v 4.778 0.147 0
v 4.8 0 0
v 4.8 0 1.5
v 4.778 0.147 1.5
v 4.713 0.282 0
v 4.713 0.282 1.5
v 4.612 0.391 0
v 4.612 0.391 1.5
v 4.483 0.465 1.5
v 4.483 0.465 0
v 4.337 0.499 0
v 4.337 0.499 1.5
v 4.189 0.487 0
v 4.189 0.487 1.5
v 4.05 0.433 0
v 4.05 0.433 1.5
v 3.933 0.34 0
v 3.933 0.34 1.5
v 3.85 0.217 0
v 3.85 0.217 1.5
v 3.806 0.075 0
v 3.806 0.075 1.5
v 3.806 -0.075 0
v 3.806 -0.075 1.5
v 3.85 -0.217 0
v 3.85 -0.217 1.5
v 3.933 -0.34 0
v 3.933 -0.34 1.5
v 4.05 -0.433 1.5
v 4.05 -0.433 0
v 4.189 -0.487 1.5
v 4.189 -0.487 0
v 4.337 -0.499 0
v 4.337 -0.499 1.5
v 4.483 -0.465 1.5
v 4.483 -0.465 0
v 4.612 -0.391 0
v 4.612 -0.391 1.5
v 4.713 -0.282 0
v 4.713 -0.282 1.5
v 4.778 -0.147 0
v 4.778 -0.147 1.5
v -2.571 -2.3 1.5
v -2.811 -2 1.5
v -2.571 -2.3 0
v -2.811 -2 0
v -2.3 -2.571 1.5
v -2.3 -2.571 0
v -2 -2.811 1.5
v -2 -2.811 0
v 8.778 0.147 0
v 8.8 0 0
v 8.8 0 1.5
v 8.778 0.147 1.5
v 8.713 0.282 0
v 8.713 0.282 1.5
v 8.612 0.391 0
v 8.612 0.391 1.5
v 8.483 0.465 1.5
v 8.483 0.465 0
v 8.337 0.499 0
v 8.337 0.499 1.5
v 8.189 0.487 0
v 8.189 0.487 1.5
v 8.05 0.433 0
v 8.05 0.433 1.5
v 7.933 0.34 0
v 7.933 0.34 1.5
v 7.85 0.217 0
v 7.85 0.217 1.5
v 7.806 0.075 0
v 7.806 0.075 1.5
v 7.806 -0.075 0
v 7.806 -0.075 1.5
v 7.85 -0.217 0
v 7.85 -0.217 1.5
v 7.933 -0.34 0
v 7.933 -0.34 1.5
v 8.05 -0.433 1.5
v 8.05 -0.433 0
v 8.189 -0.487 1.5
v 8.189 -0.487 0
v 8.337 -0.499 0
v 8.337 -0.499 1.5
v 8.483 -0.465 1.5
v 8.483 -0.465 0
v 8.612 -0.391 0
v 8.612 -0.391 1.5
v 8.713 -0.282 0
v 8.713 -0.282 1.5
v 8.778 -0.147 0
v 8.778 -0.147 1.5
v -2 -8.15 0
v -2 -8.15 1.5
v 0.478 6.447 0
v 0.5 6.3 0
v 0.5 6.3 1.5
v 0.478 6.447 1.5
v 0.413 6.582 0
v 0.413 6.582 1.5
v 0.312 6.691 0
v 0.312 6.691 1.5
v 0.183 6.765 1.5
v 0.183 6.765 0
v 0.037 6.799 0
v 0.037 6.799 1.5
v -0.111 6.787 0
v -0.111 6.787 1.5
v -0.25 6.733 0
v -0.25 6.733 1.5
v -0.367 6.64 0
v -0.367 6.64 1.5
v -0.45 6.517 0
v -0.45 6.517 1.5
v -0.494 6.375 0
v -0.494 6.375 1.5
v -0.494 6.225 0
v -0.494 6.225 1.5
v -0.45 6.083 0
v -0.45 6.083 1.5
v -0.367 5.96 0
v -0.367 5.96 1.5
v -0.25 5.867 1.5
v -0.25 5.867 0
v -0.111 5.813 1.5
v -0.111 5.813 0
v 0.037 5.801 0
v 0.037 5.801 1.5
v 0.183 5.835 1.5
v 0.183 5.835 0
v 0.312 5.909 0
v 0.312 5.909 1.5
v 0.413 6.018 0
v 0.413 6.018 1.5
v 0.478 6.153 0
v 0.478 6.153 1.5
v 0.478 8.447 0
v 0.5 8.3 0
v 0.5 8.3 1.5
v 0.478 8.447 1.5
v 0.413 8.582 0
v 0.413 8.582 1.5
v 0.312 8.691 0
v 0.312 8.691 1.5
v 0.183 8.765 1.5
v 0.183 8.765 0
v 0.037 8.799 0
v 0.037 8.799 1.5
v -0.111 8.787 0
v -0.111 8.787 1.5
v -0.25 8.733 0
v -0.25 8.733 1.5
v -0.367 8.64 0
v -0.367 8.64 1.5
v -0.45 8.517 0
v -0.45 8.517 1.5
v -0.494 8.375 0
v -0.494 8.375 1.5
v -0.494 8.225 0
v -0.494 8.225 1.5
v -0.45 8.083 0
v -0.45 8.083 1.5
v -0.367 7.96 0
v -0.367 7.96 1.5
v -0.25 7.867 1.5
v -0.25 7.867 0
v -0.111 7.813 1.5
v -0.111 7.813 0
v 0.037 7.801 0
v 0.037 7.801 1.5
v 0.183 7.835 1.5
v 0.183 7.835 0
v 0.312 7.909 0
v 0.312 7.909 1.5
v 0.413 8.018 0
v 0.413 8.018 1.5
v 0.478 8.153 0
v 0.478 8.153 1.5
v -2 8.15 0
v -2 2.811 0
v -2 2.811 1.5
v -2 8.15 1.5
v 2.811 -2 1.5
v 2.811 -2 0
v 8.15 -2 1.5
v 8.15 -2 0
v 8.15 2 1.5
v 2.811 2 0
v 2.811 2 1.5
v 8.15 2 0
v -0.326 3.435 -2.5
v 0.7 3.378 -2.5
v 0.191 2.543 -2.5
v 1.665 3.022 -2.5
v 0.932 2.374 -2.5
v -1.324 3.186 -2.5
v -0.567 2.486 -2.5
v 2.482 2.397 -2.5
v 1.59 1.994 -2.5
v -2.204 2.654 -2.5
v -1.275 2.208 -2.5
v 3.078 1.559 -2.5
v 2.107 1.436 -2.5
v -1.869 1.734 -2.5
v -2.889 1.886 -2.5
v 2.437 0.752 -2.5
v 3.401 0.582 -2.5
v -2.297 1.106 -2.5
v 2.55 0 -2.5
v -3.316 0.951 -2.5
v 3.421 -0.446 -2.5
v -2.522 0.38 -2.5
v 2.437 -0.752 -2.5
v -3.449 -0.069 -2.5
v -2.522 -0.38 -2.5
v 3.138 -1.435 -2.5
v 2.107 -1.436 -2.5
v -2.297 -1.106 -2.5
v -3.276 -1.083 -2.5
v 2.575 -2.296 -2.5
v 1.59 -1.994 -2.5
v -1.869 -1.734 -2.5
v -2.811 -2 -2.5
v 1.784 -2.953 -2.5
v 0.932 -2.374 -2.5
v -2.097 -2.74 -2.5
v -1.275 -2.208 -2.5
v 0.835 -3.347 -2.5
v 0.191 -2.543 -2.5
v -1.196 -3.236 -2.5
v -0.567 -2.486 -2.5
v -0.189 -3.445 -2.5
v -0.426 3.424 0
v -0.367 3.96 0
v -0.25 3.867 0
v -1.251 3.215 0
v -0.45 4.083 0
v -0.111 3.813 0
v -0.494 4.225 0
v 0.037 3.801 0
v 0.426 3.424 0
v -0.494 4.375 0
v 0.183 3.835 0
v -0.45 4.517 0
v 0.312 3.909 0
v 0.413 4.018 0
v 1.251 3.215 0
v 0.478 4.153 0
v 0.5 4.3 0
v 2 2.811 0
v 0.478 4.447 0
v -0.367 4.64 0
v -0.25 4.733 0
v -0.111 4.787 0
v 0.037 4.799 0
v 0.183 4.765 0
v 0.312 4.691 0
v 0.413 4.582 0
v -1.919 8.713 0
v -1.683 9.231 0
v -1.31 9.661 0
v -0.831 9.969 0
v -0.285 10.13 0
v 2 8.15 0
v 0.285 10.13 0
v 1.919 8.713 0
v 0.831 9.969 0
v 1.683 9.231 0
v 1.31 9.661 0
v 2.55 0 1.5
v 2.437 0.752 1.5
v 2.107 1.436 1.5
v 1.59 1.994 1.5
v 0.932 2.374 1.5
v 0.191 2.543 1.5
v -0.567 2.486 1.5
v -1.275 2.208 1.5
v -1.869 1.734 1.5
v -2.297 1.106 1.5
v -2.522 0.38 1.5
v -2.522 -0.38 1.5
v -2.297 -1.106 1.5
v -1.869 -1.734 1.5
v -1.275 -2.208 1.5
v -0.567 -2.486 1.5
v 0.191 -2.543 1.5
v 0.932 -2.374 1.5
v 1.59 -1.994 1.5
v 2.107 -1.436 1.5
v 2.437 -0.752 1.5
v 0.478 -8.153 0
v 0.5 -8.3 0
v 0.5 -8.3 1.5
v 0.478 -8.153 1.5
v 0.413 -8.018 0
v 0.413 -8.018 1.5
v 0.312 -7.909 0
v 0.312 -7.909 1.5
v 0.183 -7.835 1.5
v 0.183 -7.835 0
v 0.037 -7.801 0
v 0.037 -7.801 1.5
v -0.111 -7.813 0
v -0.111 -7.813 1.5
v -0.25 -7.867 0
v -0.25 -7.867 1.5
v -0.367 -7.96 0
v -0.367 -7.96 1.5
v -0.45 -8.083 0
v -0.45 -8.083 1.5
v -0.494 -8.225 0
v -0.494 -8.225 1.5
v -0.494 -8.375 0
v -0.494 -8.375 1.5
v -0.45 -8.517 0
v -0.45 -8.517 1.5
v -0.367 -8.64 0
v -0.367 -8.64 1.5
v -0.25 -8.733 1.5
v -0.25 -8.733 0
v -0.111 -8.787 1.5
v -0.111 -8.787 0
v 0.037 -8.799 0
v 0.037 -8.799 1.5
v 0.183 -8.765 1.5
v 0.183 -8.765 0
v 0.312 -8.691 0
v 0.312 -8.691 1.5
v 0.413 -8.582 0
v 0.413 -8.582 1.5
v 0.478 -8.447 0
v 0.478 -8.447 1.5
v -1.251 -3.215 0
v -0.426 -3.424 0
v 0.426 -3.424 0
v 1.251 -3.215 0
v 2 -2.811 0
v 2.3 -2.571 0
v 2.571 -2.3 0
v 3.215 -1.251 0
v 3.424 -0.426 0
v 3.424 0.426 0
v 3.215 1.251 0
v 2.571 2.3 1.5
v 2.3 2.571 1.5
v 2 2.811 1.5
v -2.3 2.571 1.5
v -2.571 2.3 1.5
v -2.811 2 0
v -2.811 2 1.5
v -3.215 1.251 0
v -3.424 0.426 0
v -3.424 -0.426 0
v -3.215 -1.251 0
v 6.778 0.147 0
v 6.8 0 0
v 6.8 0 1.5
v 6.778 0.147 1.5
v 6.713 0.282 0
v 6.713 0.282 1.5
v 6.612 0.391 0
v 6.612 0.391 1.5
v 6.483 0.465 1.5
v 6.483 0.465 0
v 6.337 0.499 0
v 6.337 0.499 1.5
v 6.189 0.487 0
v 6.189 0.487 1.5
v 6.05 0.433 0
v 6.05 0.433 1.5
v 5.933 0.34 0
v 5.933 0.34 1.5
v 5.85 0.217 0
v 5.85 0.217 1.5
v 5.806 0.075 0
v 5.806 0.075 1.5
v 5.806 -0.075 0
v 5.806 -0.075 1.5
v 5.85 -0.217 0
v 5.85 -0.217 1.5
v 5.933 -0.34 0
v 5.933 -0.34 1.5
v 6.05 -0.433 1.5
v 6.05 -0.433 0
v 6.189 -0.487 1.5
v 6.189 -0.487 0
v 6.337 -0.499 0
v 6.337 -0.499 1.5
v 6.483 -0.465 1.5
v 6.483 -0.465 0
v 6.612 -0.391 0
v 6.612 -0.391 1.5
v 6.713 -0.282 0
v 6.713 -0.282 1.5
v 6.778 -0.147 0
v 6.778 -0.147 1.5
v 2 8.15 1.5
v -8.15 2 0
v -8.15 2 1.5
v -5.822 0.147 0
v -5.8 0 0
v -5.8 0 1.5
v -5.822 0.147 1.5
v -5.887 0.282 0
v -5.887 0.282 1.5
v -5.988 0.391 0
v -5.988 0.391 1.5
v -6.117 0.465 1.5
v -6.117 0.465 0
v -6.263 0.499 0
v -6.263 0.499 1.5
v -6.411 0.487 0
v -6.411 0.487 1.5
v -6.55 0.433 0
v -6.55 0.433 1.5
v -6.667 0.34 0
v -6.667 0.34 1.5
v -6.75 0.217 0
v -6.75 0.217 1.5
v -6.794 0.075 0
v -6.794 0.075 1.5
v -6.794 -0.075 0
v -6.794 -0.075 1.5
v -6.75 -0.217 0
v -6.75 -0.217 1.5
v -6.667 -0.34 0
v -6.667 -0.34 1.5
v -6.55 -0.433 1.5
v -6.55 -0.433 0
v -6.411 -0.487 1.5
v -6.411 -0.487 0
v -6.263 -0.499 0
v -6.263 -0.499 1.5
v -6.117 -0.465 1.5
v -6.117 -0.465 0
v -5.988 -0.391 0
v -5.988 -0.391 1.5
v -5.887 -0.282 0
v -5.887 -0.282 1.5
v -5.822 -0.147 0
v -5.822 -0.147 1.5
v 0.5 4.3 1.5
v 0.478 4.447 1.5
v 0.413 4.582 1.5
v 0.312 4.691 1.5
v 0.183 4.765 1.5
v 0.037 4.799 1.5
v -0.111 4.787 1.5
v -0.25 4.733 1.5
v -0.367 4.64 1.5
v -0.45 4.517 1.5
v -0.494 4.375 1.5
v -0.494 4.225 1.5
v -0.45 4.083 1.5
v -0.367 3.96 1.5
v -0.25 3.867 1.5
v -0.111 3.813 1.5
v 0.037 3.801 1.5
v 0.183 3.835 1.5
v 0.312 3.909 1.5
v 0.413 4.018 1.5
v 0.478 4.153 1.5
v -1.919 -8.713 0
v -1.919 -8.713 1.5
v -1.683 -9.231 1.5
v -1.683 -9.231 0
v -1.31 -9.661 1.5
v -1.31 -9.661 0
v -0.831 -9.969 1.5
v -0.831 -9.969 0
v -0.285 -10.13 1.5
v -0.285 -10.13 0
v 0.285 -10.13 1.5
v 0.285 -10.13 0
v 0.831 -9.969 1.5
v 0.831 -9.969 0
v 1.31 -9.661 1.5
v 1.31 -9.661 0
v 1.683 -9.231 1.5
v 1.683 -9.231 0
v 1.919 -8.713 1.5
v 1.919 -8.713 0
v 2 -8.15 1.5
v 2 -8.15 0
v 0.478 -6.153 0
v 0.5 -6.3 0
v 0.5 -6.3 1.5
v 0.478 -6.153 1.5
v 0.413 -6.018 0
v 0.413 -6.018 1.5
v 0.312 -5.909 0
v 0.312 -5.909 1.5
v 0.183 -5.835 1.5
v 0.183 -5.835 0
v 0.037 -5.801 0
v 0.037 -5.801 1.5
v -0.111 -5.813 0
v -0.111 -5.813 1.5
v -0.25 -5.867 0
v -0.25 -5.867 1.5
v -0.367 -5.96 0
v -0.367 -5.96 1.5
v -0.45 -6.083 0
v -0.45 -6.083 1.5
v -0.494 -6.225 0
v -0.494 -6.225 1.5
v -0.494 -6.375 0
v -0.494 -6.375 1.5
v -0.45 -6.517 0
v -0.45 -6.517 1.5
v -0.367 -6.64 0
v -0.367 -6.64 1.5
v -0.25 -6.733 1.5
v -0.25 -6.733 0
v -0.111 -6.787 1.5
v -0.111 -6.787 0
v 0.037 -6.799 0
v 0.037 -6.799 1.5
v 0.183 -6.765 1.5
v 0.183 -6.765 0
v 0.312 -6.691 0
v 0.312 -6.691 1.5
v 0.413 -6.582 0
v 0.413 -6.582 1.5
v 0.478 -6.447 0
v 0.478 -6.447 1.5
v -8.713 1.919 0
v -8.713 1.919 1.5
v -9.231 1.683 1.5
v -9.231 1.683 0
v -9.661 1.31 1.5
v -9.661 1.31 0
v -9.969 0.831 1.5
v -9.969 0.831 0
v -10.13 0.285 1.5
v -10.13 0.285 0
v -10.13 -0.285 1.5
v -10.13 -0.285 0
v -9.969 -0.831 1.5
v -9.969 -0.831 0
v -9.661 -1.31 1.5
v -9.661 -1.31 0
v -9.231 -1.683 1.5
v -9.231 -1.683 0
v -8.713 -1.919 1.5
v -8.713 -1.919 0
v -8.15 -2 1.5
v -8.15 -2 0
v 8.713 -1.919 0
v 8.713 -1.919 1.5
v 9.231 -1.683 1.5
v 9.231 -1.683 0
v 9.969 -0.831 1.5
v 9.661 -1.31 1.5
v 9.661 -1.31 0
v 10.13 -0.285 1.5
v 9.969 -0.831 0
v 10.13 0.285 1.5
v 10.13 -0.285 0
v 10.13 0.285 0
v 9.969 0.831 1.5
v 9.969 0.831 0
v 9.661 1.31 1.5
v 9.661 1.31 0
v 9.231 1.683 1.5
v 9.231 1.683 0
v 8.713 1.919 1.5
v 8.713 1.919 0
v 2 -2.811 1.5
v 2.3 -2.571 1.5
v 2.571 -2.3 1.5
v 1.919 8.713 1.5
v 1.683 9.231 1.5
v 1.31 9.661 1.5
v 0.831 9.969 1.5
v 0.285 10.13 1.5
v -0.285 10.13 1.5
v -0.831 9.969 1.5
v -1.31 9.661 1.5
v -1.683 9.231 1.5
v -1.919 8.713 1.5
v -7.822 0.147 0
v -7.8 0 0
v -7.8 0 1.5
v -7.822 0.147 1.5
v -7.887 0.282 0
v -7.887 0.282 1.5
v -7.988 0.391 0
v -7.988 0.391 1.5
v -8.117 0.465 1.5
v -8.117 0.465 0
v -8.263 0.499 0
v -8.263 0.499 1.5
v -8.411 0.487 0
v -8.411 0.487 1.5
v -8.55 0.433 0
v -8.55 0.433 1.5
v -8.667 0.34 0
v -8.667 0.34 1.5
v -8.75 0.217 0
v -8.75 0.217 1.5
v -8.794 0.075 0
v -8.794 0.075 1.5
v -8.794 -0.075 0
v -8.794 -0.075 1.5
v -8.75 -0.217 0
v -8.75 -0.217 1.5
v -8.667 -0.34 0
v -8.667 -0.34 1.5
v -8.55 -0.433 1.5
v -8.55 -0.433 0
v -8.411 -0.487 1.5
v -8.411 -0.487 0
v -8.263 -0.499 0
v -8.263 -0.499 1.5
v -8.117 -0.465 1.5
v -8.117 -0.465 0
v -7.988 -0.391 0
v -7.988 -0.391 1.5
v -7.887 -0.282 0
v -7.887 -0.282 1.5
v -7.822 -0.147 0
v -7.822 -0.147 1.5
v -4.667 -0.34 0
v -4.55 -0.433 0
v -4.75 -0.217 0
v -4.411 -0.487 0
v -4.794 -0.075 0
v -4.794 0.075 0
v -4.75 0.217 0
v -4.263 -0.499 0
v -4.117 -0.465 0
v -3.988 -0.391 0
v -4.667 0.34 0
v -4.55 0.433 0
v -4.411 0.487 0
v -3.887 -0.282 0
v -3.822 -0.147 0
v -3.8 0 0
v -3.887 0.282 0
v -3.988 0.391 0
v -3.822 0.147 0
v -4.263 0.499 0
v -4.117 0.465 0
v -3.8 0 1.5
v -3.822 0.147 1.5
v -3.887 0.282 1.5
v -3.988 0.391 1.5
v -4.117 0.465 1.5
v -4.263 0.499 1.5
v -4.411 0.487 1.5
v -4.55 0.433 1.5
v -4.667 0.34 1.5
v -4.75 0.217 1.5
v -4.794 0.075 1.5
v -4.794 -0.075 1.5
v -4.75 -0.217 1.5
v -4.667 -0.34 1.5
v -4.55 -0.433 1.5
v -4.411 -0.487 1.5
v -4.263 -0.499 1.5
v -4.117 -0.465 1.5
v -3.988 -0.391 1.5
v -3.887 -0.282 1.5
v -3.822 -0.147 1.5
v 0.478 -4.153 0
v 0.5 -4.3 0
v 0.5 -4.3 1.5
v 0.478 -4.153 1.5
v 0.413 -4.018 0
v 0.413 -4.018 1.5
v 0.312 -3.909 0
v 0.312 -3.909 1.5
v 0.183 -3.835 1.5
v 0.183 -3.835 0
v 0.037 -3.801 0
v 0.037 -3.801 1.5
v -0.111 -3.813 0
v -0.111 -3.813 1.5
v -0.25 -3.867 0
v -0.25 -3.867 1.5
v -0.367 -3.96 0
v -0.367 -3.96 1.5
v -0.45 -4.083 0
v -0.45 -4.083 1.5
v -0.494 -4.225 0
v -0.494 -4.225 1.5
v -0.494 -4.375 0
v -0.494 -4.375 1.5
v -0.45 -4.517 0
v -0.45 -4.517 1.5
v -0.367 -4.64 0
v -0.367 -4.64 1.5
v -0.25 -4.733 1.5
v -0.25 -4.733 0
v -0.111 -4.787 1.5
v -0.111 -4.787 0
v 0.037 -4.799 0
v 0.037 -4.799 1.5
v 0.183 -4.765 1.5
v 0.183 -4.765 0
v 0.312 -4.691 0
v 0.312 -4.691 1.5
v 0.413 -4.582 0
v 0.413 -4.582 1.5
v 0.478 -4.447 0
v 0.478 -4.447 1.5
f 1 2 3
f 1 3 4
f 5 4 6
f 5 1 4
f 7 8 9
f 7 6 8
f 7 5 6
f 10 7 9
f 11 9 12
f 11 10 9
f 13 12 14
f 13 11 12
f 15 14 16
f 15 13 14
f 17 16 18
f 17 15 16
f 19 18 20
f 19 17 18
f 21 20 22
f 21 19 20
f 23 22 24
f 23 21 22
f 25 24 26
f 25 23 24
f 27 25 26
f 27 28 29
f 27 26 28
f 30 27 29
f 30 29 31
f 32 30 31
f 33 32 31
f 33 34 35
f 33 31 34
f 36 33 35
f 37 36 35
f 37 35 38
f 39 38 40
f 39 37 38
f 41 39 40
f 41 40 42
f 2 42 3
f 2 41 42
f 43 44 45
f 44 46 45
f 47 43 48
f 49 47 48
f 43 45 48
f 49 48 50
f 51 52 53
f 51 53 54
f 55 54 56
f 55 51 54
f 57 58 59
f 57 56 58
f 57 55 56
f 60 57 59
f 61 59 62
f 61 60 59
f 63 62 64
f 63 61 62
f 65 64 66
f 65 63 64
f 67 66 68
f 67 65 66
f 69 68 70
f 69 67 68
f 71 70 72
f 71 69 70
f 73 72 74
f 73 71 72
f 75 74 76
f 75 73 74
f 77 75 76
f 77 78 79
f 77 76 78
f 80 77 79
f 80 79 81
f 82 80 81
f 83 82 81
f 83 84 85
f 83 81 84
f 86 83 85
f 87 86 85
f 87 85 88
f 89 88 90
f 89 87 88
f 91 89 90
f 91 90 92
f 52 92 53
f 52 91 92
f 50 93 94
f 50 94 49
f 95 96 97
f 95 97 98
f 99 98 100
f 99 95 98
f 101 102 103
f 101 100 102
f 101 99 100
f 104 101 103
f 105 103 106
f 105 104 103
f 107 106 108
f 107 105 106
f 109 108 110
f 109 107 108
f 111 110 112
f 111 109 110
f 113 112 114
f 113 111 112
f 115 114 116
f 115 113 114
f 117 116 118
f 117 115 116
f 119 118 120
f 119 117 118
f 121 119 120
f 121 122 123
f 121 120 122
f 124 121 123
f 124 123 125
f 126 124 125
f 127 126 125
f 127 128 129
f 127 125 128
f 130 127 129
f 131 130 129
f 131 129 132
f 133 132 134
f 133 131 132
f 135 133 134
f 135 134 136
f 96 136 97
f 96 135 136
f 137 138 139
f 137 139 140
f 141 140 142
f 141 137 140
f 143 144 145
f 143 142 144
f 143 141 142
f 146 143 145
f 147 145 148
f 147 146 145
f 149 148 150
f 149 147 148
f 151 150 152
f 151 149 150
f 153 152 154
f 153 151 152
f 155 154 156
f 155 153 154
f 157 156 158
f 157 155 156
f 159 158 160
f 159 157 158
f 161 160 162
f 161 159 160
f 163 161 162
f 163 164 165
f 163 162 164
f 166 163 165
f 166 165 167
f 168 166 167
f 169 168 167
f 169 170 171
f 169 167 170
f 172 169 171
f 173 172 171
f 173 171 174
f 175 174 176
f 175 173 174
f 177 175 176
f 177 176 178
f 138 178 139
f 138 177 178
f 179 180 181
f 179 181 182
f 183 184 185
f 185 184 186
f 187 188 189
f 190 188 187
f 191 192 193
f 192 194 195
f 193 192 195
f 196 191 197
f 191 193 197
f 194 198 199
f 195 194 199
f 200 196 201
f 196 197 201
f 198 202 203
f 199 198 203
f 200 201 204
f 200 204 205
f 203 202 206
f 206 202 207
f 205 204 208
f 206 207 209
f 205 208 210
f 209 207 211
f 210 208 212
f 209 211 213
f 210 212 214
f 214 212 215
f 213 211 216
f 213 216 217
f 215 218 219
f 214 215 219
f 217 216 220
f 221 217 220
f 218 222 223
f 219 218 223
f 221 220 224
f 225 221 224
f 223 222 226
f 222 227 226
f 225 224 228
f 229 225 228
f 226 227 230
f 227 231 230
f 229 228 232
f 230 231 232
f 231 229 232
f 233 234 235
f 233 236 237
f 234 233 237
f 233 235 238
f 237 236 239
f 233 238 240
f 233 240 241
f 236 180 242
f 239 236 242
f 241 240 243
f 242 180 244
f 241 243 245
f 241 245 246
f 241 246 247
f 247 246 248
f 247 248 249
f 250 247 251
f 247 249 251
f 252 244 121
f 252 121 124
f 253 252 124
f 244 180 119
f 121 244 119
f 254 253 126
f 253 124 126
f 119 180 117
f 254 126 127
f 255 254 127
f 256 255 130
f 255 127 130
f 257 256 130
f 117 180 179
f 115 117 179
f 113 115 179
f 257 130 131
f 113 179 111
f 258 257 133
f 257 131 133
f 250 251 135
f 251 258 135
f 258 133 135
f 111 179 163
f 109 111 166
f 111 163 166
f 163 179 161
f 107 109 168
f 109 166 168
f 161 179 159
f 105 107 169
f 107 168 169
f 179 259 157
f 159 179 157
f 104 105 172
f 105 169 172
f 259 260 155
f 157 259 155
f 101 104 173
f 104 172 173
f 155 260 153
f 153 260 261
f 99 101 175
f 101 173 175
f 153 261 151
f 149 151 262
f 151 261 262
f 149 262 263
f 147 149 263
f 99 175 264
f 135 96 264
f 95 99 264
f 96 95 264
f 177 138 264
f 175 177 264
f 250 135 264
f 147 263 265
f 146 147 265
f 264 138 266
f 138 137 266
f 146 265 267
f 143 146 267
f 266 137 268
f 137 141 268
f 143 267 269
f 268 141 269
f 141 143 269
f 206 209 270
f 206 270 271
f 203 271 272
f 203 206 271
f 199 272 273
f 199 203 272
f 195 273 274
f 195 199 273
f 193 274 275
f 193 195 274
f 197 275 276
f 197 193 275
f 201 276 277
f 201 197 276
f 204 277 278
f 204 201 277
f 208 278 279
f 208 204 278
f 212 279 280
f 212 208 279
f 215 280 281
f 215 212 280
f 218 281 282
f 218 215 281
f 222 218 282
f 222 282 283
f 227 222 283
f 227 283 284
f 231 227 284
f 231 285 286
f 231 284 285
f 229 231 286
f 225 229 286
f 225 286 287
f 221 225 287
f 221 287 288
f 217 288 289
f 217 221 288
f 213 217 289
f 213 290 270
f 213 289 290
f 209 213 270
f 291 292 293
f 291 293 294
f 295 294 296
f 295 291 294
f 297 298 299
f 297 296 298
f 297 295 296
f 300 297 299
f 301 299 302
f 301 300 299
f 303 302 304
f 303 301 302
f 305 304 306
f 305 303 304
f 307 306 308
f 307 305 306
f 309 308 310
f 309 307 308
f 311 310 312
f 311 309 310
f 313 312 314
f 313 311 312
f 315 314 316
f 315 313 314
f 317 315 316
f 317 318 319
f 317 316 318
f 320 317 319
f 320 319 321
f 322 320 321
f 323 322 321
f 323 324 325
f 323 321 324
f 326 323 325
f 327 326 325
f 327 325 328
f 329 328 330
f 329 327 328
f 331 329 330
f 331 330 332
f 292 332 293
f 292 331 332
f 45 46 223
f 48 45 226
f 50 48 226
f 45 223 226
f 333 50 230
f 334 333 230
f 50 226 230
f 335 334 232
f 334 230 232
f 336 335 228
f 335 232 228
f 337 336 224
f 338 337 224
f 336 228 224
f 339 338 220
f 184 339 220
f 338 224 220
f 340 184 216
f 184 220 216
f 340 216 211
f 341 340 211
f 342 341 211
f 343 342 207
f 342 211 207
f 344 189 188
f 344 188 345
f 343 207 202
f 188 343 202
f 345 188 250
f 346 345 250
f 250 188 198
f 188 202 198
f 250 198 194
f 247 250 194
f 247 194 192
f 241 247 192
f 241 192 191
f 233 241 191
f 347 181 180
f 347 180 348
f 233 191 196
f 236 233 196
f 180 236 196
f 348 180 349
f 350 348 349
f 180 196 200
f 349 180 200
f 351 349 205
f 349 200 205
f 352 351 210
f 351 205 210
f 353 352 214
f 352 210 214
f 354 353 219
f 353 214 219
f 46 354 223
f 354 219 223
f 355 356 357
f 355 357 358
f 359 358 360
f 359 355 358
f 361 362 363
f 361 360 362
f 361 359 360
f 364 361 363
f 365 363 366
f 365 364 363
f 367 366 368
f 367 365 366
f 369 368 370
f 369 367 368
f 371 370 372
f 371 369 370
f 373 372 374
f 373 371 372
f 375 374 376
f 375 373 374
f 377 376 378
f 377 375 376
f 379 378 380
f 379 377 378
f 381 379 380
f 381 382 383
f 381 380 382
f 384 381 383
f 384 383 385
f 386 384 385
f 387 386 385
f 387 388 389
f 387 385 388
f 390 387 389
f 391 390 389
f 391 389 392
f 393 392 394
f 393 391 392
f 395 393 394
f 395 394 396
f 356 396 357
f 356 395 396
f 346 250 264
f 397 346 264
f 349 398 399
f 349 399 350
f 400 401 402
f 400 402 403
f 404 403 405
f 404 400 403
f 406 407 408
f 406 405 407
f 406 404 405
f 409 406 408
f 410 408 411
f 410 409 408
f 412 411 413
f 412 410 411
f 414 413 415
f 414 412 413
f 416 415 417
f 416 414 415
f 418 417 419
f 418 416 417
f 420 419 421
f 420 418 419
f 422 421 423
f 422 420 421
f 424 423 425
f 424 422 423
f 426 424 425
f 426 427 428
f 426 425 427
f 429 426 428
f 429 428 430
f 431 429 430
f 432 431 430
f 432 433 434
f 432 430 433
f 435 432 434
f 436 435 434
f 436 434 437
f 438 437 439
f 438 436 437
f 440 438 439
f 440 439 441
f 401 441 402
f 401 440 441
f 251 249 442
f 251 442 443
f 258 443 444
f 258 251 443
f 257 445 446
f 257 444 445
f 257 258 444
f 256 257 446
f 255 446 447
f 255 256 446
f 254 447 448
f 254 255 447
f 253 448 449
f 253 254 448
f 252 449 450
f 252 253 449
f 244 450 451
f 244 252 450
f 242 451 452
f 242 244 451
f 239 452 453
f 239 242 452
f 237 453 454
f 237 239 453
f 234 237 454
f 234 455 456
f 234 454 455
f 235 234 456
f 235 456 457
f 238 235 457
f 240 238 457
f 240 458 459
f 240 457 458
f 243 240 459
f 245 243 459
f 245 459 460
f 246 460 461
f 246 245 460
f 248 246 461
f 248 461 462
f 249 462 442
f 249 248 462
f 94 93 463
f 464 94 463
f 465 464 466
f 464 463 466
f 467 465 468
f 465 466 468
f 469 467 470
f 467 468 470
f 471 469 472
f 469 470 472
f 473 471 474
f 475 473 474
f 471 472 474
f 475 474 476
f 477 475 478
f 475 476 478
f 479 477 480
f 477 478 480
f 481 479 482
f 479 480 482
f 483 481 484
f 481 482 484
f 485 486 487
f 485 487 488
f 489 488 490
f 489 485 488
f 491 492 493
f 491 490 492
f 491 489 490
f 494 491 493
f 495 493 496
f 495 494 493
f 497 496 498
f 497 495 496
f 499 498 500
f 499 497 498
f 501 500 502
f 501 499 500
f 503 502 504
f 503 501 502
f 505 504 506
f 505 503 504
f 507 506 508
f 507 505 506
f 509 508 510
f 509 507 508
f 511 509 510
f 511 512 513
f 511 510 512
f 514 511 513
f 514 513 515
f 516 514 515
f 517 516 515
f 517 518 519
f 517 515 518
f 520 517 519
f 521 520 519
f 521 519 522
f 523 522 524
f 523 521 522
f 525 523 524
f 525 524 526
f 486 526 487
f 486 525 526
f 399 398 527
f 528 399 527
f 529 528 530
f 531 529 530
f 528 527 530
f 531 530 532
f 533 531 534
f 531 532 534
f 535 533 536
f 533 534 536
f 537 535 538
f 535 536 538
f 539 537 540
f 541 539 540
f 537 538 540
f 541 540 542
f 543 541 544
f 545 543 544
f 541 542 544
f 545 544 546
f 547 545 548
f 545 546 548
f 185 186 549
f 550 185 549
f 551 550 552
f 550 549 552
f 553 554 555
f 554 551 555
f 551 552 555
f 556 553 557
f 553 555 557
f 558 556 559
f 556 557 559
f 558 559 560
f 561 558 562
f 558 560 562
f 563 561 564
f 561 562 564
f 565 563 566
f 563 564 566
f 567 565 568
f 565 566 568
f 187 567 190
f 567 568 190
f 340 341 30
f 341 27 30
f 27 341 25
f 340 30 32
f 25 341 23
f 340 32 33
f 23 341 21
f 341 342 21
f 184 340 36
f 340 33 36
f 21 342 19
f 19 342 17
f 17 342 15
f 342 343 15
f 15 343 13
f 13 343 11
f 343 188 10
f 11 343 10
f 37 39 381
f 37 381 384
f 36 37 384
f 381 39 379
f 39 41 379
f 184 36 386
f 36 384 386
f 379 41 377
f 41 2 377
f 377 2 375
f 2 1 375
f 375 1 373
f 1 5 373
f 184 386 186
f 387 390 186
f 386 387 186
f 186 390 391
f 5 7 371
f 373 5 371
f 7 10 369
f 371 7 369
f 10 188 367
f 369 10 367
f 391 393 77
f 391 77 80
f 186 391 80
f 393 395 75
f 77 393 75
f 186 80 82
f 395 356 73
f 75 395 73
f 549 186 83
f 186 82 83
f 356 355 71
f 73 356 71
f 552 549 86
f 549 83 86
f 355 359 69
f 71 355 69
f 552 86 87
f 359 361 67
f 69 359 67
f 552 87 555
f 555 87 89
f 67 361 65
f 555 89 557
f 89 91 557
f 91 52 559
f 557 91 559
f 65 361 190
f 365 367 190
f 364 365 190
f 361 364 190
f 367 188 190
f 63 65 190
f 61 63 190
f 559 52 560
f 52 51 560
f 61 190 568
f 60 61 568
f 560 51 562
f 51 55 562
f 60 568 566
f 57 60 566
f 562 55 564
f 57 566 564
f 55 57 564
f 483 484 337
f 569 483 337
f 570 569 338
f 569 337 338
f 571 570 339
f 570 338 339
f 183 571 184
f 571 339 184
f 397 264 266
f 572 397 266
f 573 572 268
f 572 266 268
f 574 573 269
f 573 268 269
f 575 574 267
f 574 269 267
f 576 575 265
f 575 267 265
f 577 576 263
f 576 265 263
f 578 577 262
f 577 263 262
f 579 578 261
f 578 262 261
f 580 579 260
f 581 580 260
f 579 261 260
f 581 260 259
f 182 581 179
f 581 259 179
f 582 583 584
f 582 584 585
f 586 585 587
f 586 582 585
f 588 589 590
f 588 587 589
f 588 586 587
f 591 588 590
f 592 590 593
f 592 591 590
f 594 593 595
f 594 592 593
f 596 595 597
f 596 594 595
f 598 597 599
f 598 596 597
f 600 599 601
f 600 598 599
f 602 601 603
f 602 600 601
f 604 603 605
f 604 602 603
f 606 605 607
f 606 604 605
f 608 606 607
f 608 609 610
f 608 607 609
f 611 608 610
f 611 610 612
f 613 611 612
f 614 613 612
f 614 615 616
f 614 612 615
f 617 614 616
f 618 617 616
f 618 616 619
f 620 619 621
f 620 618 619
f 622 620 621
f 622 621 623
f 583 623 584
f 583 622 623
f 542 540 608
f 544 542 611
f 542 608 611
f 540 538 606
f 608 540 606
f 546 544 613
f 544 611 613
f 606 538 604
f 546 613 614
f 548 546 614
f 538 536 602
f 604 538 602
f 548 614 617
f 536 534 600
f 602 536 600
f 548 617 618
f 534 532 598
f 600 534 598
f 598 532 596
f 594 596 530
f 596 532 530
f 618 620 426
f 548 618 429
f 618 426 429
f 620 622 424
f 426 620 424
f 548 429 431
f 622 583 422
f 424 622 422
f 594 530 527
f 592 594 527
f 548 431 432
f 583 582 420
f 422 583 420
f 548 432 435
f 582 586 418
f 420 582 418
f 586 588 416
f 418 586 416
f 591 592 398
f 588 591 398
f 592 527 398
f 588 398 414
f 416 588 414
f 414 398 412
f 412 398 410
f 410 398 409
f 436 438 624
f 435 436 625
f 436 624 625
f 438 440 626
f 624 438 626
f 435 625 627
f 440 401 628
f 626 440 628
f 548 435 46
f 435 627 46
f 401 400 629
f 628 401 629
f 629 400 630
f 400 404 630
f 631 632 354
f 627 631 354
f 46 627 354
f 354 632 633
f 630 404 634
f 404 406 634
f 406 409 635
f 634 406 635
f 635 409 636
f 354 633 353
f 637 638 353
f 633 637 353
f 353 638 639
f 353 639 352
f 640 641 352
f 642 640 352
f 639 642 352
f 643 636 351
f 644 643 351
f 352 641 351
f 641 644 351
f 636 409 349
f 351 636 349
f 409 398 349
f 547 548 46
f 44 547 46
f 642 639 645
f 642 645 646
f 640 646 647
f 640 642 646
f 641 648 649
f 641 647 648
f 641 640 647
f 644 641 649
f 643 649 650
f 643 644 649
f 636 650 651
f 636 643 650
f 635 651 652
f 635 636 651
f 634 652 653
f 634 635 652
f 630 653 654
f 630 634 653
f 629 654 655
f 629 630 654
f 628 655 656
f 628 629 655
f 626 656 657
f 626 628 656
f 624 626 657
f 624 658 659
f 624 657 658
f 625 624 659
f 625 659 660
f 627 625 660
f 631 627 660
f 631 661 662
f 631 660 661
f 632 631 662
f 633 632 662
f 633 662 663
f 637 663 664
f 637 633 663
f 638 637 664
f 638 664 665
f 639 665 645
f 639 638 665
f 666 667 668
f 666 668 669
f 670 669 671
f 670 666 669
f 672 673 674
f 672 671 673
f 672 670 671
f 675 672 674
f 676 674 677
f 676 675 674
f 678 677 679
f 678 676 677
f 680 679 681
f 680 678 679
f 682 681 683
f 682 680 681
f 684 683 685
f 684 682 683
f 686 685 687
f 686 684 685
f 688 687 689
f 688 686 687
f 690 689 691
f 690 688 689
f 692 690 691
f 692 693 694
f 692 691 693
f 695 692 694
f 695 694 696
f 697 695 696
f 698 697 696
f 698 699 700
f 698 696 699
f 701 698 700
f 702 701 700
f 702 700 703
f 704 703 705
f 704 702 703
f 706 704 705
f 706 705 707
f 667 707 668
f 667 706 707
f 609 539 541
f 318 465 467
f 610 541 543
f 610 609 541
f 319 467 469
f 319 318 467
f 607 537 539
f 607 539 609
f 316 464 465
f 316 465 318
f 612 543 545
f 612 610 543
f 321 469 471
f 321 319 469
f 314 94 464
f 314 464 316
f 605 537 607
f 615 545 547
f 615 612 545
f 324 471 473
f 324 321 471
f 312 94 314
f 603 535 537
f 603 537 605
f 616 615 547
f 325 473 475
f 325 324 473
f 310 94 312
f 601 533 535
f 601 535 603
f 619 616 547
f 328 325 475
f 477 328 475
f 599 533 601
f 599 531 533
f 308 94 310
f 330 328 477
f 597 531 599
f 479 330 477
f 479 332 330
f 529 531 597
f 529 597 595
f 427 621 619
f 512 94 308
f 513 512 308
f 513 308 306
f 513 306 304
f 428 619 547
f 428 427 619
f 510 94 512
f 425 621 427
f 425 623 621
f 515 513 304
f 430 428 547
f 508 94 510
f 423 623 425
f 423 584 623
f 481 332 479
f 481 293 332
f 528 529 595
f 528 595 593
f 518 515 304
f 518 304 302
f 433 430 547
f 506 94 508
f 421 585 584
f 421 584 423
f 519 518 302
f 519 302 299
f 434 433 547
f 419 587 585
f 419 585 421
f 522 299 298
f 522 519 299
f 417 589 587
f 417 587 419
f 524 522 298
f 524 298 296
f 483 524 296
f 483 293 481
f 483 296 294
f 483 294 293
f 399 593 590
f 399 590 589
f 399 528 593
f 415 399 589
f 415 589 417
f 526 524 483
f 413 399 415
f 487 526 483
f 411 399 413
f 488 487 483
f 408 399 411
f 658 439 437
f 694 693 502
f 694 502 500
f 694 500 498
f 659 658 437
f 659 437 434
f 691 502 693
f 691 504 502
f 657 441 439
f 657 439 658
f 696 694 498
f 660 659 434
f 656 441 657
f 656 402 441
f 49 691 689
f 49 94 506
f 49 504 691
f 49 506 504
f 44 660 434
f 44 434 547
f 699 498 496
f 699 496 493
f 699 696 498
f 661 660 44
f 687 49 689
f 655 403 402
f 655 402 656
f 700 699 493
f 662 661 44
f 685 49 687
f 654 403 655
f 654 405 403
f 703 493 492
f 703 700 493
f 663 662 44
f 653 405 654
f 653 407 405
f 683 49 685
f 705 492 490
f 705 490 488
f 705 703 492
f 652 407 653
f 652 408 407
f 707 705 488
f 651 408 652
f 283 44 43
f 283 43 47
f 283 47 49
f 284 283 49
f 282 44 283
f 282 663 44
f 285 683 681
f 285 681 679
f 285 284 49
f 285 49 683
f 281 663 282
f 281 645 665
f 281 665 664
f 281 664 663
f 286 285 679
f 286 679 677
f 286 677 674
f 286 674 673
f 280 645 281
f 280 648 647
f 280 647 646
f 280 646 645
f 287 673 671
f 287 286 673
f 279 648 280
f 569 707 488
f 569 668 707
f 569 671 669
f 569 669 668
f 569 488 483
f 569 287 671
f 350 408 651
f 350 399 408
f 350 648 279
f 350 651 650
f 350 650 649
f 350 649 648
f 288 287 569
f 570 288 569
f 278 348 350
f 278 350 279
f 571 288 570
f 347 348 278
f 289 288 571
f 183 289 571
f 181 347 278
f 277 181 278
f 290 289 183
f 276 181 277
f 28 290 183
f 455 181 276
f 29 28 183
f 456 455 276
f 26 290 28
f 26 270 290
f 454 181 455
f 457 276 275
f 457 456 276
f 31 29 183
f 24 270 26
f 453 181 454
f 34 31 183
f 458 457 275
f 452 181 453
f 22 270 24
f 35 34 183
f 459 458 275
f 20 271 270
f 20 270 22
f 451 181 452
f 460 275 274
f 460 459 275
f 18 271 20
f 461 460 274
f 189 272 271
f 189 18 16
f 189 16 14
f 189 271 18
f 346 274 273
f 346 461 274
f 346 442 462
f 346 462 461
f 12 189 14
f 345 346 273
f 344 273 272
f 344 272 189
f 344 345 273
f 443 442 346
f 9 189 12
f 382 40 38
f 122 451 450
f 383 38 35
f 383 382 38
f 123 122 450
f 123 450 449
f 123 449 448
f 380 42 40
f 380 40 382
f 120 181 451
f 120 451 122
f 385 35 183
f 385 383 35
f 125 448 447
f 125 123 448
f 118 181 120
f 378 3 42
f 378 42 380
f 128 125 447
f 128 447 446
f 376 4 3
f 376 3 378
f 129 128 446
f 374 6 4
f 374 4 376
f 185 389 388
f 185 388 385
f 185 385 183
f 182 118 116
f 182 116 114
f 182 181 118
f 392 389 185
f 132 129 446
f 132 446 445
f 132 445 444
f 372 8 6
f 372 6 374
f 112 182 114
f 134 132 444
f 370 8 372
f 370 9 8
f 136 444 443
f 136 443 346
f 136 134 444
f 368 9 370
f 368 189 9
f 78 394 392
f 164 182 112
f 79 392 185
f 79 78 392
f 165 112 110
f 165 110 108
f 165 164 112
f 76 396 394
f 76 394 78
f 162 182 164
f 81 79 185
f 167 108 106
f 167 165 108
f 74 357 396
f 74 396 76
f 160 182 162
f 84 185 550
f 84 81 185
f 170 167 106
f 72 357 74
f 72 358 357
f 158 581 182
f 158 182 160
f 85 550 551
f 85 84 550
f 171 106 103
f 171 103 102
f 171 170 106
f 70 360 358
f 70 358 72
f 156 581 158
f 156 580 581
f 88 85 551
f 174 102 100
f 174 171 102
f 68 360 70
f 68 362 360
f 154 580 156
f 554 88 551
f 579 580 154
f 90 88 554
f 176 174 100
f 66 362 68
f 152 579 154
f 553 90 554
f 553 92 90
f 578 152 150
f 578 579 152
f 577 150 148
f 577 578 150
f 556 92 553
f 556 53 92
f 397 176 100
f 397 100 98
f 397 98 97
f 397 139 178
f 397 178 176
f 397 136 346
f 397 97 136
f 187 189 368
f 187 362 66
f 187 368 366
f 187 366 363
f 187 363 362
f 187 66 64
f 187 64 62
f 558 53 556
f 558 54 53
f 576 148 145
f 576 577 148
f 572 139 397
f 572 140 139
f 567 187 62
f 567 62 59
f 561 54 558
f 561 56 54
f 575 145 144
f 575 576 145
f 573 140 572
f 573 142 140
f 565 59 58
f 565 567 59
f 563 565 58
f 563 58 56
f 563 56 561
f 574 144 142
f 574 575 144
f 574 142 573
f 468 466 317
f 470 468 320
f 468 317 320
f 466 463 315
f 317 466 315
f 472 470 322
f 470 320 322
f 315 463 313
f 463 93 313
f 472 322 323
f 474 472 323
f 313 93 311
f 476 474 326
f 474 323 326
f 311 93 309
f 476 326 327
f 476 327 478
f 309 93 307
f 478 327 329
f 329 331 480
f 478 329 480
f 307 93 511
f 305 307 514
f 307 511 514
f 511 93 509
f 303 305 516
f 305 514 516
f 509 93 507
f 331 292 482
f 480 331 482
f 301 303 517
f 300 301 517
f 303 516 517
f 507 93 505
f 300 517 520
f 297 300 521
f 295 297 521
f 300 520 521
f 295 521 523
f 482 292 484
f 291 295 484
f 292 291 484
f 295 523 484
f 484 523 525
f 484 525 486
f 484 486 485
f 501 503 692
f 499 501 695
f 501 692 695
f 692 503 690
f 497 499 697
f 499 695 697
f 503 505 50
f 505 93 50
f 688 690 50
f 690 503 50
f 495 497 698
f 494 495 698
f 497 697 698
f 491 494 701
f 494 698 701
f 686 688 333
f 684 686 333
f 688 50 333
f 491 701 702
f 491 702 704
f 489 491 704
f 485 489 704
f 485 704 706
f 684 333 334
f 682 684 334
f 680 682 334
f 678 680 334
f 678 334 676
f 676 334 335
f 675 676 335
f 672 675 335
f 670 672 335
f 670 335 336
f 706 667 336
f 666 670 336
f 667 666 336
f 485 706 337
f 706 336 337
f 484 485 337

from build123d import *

# Parameters (mm, degrees)
COMPACT_HORN_CENTER_OD6P9_PROFILE_R        = 3.45
COMPACT_HORN_CENTER_OD6P9_DEPTH            = 1.5
HORIZONTAL_BLADES_ASSUMED_WIDTH4_PROFILE_W = 16.3
HORIZONTAL_BLADES_ASSUMED_WIDTH4_PROFILE_H = 4
HORIZONTAL_BLADES_ASSUMED_WIDTH4_DEPTH     = 1.5
VERTICAL_BLADES_ASSUMED_WIDTH4_PROFILE_W   = 4
VERTICAL_BLADES_ASSUMED_WIDTH4_PROFILE_H   = 16.3
VERTICAL_BLADES_ASSUMED_WIDTH4_DEPTH       = 1.5
ROUNDED_BLADE_TIPS_R                       = 2
ROUNDED_TIPS_SPAN20P3_DEPTH                = 1.5
HUB_PROJECTION2P5_TOTAL_HEIGHT4_START      = -2.5
HUB_PROJECTION2P5_TOTAL_HEIGHT4_PROFILE_R  = 3.45
HUB_PROJECTION2P5_TOTAL_HEIGHT4_DEPTH      = 2.5
PURCHASED_SPLINE_INTERNALS_OMITTED_START   = -50
PURCHASED_SPLINE_INTERNALS_OMITTED_PROFI_R = 2.55
PURCHASED_SPLINE_INTERNALS_OMITTED_DEPTH   = 65.570346598
UNMODIFIED_STOCK_PILOT_HOLES_START         = -50
UNMODIFIED_STOCK_PILOT_HOLES_PROFILE_R     = 0.5
UNMODIFIED_STOCK_PILOT_HOLES_DEPTH         = 65.570346598


with BuildPart() as part:
    # Compact_horn_center_OD6p9_profile → Compact_horn_center_OD6p9 (new body)
    with BuildSketch(Plane.XY):
        Circle(COMPACT_HORN_CENTER_OD6P9_PROFILE_R)
    extrude(amount=COMPACT_HORN_CENTER_OD6P9_DEPTH)

    # Horizontal_blades_assumed_width4_profile → Horizontal_blades_assumed_width4 (add)
    with BuildSketch(Plane.XY):
        Rectangle(HORIZONTAL_BLADES_ASSUMED_WIDTH4_PROFILE_W, HORIZONTAL_BLADES_ASSUMED_WIDTH4_PROFILE_H)
    extrude(amount=HORIZONTAL_BLADES_ASSUMED_WIDTH4_DEPTH)

    # Vertical_blades_assumed_width4_profile → Vertical_blades_assumed_width4 (add)
    with BuildSketch(Plane.XY):
        Rectangle(VERTICAL_BLADES_ASSUMED_WIDTH4_PROFILE_W, VERTICAL_BLADES_ASSUMED_WIDTH4_PROFILE_H)
    extrude(amount=VERTICAL_BLADES_ASSUMED_WIDTH4_DEPTH)

    # Rounded_blade_tips → Rounded_tips_span20p3 (add)
    with BuildSketch(Plane.XY):
        with Locations((8.15, 0)):
            Circle(ROUNDED_BLADE_TIPS_R)
        with Locations((-8.15, 0)):
            Circle(ROUNDED_BLADE_TIPS_R)
        with Locations((0, 8.15)):
            Circle(ROUNDED_BLADE_TIPS_R)
        with Locations((0, -8.15)):
            Circle(ROUNDED_BLADE_TIPS_R)
    extrude(amount=ROUNDED_TIPS_SPAN20P3_DEPTH)

    # Hub_projection2p5_total_height4_profile → Hub_projection2p5_total_height4 (add)
    with BuildSketch(Plane.XY.offset(HUB_PROJECTION2P5_TOTAL_HEIGHT4_START)):
        with Locations(Location((0, 0, 0), (0, 0, 215.43015836))):
            Circle(HUB_PROJECTION2P5_TOTAL_HEIGHT4_PROFILE_R)
    extrude(amount=HUB_PROJECTION2P5_TOTAL_HEIGHT4_DEPTH)

    # Purchased_spline_internals_omitted_profile → Purchased_spline_internals_omitted (cut, through all)
    with BuildSketch(Plane.XY.offset(PURCHASED_SPLINE_INTERNALS_OMITTED_START)):
        Circle(PURCHASED_SPLINE_INTERNALS_OMITTED_PROFI_R)
    extrude(amount=PURCHASED_SPLINE_INTERNALS_OMITTED_DEPTH, mode=Mode.SUBTRACT)

    # Unmodified_stock_pilot_holes_profile → Unmodified_stock_pilot_holes (cut, through all)
    with BuildSketch(Plane.XY.offset(UNMODIFIED_STOCK_PILOT_HOLES_START)):
        with Locations((-8.3, 0)):
            Circle(UNMODIFIED_STOCK_PILOT_HOLES_PROFILE_R)
        with Locations((-6.3, 0)):
            Circle(UNMODIFIED_STOCK_PILOT_HOLES_PROFILE_R)
        with Locations((-4.3, 0)):
            Circle(UNMODIFIED_STOCK_PILOT_HOLES_PROFILE_R)
        with Locations((4.3, 0)):
            Circle(UNMODIFIED_STOCK_PILOT_HOLES_PROFILE_R)
        with Locations((6.3, 0)):
            Circle(UNMODIFIED_STOCK_PILOT_HOLES_PROFILE_R)
        with Locations((8.3, 0)):
            Circle(UNMODIFIED_STOCK_PILOT_HOLES_PROFILE_R)
        with Locations((0, -8.3)):
            Circle(UNMODIFIED_STOCK_PILOT_HOLES_PROFILE_R)
        with Locations((0, -6.3)):
            Circle(UNMODIFIED_STOCK_PILOT_HOLES_PROFILE_R)
        with Locations((0, -4.3)):
            Circle(UNMODIFIED_STOCK_PILOT_HOLES_PROFILE_R)
        with Locations((0, 4.3)):
            Circle(UNMODIFIED_STOCK_PILOT_HOLES_PROFILE_R)
        with Locations((0, 6.3)):
            Circle(UNMODIFIED_STOCK_PILOT_HOLES_PROFILE_R)
        with Locations((0, 8.3)):
            Circle(UNMODIFIED_STOCK_PILOT_HOLES_PROFILE_R)
    extrude(amount=UNMODIFIED_STOCK_PILOT_HOLES_DEPTH, mode=Mode.SUBTRACT)


solid = part.part
